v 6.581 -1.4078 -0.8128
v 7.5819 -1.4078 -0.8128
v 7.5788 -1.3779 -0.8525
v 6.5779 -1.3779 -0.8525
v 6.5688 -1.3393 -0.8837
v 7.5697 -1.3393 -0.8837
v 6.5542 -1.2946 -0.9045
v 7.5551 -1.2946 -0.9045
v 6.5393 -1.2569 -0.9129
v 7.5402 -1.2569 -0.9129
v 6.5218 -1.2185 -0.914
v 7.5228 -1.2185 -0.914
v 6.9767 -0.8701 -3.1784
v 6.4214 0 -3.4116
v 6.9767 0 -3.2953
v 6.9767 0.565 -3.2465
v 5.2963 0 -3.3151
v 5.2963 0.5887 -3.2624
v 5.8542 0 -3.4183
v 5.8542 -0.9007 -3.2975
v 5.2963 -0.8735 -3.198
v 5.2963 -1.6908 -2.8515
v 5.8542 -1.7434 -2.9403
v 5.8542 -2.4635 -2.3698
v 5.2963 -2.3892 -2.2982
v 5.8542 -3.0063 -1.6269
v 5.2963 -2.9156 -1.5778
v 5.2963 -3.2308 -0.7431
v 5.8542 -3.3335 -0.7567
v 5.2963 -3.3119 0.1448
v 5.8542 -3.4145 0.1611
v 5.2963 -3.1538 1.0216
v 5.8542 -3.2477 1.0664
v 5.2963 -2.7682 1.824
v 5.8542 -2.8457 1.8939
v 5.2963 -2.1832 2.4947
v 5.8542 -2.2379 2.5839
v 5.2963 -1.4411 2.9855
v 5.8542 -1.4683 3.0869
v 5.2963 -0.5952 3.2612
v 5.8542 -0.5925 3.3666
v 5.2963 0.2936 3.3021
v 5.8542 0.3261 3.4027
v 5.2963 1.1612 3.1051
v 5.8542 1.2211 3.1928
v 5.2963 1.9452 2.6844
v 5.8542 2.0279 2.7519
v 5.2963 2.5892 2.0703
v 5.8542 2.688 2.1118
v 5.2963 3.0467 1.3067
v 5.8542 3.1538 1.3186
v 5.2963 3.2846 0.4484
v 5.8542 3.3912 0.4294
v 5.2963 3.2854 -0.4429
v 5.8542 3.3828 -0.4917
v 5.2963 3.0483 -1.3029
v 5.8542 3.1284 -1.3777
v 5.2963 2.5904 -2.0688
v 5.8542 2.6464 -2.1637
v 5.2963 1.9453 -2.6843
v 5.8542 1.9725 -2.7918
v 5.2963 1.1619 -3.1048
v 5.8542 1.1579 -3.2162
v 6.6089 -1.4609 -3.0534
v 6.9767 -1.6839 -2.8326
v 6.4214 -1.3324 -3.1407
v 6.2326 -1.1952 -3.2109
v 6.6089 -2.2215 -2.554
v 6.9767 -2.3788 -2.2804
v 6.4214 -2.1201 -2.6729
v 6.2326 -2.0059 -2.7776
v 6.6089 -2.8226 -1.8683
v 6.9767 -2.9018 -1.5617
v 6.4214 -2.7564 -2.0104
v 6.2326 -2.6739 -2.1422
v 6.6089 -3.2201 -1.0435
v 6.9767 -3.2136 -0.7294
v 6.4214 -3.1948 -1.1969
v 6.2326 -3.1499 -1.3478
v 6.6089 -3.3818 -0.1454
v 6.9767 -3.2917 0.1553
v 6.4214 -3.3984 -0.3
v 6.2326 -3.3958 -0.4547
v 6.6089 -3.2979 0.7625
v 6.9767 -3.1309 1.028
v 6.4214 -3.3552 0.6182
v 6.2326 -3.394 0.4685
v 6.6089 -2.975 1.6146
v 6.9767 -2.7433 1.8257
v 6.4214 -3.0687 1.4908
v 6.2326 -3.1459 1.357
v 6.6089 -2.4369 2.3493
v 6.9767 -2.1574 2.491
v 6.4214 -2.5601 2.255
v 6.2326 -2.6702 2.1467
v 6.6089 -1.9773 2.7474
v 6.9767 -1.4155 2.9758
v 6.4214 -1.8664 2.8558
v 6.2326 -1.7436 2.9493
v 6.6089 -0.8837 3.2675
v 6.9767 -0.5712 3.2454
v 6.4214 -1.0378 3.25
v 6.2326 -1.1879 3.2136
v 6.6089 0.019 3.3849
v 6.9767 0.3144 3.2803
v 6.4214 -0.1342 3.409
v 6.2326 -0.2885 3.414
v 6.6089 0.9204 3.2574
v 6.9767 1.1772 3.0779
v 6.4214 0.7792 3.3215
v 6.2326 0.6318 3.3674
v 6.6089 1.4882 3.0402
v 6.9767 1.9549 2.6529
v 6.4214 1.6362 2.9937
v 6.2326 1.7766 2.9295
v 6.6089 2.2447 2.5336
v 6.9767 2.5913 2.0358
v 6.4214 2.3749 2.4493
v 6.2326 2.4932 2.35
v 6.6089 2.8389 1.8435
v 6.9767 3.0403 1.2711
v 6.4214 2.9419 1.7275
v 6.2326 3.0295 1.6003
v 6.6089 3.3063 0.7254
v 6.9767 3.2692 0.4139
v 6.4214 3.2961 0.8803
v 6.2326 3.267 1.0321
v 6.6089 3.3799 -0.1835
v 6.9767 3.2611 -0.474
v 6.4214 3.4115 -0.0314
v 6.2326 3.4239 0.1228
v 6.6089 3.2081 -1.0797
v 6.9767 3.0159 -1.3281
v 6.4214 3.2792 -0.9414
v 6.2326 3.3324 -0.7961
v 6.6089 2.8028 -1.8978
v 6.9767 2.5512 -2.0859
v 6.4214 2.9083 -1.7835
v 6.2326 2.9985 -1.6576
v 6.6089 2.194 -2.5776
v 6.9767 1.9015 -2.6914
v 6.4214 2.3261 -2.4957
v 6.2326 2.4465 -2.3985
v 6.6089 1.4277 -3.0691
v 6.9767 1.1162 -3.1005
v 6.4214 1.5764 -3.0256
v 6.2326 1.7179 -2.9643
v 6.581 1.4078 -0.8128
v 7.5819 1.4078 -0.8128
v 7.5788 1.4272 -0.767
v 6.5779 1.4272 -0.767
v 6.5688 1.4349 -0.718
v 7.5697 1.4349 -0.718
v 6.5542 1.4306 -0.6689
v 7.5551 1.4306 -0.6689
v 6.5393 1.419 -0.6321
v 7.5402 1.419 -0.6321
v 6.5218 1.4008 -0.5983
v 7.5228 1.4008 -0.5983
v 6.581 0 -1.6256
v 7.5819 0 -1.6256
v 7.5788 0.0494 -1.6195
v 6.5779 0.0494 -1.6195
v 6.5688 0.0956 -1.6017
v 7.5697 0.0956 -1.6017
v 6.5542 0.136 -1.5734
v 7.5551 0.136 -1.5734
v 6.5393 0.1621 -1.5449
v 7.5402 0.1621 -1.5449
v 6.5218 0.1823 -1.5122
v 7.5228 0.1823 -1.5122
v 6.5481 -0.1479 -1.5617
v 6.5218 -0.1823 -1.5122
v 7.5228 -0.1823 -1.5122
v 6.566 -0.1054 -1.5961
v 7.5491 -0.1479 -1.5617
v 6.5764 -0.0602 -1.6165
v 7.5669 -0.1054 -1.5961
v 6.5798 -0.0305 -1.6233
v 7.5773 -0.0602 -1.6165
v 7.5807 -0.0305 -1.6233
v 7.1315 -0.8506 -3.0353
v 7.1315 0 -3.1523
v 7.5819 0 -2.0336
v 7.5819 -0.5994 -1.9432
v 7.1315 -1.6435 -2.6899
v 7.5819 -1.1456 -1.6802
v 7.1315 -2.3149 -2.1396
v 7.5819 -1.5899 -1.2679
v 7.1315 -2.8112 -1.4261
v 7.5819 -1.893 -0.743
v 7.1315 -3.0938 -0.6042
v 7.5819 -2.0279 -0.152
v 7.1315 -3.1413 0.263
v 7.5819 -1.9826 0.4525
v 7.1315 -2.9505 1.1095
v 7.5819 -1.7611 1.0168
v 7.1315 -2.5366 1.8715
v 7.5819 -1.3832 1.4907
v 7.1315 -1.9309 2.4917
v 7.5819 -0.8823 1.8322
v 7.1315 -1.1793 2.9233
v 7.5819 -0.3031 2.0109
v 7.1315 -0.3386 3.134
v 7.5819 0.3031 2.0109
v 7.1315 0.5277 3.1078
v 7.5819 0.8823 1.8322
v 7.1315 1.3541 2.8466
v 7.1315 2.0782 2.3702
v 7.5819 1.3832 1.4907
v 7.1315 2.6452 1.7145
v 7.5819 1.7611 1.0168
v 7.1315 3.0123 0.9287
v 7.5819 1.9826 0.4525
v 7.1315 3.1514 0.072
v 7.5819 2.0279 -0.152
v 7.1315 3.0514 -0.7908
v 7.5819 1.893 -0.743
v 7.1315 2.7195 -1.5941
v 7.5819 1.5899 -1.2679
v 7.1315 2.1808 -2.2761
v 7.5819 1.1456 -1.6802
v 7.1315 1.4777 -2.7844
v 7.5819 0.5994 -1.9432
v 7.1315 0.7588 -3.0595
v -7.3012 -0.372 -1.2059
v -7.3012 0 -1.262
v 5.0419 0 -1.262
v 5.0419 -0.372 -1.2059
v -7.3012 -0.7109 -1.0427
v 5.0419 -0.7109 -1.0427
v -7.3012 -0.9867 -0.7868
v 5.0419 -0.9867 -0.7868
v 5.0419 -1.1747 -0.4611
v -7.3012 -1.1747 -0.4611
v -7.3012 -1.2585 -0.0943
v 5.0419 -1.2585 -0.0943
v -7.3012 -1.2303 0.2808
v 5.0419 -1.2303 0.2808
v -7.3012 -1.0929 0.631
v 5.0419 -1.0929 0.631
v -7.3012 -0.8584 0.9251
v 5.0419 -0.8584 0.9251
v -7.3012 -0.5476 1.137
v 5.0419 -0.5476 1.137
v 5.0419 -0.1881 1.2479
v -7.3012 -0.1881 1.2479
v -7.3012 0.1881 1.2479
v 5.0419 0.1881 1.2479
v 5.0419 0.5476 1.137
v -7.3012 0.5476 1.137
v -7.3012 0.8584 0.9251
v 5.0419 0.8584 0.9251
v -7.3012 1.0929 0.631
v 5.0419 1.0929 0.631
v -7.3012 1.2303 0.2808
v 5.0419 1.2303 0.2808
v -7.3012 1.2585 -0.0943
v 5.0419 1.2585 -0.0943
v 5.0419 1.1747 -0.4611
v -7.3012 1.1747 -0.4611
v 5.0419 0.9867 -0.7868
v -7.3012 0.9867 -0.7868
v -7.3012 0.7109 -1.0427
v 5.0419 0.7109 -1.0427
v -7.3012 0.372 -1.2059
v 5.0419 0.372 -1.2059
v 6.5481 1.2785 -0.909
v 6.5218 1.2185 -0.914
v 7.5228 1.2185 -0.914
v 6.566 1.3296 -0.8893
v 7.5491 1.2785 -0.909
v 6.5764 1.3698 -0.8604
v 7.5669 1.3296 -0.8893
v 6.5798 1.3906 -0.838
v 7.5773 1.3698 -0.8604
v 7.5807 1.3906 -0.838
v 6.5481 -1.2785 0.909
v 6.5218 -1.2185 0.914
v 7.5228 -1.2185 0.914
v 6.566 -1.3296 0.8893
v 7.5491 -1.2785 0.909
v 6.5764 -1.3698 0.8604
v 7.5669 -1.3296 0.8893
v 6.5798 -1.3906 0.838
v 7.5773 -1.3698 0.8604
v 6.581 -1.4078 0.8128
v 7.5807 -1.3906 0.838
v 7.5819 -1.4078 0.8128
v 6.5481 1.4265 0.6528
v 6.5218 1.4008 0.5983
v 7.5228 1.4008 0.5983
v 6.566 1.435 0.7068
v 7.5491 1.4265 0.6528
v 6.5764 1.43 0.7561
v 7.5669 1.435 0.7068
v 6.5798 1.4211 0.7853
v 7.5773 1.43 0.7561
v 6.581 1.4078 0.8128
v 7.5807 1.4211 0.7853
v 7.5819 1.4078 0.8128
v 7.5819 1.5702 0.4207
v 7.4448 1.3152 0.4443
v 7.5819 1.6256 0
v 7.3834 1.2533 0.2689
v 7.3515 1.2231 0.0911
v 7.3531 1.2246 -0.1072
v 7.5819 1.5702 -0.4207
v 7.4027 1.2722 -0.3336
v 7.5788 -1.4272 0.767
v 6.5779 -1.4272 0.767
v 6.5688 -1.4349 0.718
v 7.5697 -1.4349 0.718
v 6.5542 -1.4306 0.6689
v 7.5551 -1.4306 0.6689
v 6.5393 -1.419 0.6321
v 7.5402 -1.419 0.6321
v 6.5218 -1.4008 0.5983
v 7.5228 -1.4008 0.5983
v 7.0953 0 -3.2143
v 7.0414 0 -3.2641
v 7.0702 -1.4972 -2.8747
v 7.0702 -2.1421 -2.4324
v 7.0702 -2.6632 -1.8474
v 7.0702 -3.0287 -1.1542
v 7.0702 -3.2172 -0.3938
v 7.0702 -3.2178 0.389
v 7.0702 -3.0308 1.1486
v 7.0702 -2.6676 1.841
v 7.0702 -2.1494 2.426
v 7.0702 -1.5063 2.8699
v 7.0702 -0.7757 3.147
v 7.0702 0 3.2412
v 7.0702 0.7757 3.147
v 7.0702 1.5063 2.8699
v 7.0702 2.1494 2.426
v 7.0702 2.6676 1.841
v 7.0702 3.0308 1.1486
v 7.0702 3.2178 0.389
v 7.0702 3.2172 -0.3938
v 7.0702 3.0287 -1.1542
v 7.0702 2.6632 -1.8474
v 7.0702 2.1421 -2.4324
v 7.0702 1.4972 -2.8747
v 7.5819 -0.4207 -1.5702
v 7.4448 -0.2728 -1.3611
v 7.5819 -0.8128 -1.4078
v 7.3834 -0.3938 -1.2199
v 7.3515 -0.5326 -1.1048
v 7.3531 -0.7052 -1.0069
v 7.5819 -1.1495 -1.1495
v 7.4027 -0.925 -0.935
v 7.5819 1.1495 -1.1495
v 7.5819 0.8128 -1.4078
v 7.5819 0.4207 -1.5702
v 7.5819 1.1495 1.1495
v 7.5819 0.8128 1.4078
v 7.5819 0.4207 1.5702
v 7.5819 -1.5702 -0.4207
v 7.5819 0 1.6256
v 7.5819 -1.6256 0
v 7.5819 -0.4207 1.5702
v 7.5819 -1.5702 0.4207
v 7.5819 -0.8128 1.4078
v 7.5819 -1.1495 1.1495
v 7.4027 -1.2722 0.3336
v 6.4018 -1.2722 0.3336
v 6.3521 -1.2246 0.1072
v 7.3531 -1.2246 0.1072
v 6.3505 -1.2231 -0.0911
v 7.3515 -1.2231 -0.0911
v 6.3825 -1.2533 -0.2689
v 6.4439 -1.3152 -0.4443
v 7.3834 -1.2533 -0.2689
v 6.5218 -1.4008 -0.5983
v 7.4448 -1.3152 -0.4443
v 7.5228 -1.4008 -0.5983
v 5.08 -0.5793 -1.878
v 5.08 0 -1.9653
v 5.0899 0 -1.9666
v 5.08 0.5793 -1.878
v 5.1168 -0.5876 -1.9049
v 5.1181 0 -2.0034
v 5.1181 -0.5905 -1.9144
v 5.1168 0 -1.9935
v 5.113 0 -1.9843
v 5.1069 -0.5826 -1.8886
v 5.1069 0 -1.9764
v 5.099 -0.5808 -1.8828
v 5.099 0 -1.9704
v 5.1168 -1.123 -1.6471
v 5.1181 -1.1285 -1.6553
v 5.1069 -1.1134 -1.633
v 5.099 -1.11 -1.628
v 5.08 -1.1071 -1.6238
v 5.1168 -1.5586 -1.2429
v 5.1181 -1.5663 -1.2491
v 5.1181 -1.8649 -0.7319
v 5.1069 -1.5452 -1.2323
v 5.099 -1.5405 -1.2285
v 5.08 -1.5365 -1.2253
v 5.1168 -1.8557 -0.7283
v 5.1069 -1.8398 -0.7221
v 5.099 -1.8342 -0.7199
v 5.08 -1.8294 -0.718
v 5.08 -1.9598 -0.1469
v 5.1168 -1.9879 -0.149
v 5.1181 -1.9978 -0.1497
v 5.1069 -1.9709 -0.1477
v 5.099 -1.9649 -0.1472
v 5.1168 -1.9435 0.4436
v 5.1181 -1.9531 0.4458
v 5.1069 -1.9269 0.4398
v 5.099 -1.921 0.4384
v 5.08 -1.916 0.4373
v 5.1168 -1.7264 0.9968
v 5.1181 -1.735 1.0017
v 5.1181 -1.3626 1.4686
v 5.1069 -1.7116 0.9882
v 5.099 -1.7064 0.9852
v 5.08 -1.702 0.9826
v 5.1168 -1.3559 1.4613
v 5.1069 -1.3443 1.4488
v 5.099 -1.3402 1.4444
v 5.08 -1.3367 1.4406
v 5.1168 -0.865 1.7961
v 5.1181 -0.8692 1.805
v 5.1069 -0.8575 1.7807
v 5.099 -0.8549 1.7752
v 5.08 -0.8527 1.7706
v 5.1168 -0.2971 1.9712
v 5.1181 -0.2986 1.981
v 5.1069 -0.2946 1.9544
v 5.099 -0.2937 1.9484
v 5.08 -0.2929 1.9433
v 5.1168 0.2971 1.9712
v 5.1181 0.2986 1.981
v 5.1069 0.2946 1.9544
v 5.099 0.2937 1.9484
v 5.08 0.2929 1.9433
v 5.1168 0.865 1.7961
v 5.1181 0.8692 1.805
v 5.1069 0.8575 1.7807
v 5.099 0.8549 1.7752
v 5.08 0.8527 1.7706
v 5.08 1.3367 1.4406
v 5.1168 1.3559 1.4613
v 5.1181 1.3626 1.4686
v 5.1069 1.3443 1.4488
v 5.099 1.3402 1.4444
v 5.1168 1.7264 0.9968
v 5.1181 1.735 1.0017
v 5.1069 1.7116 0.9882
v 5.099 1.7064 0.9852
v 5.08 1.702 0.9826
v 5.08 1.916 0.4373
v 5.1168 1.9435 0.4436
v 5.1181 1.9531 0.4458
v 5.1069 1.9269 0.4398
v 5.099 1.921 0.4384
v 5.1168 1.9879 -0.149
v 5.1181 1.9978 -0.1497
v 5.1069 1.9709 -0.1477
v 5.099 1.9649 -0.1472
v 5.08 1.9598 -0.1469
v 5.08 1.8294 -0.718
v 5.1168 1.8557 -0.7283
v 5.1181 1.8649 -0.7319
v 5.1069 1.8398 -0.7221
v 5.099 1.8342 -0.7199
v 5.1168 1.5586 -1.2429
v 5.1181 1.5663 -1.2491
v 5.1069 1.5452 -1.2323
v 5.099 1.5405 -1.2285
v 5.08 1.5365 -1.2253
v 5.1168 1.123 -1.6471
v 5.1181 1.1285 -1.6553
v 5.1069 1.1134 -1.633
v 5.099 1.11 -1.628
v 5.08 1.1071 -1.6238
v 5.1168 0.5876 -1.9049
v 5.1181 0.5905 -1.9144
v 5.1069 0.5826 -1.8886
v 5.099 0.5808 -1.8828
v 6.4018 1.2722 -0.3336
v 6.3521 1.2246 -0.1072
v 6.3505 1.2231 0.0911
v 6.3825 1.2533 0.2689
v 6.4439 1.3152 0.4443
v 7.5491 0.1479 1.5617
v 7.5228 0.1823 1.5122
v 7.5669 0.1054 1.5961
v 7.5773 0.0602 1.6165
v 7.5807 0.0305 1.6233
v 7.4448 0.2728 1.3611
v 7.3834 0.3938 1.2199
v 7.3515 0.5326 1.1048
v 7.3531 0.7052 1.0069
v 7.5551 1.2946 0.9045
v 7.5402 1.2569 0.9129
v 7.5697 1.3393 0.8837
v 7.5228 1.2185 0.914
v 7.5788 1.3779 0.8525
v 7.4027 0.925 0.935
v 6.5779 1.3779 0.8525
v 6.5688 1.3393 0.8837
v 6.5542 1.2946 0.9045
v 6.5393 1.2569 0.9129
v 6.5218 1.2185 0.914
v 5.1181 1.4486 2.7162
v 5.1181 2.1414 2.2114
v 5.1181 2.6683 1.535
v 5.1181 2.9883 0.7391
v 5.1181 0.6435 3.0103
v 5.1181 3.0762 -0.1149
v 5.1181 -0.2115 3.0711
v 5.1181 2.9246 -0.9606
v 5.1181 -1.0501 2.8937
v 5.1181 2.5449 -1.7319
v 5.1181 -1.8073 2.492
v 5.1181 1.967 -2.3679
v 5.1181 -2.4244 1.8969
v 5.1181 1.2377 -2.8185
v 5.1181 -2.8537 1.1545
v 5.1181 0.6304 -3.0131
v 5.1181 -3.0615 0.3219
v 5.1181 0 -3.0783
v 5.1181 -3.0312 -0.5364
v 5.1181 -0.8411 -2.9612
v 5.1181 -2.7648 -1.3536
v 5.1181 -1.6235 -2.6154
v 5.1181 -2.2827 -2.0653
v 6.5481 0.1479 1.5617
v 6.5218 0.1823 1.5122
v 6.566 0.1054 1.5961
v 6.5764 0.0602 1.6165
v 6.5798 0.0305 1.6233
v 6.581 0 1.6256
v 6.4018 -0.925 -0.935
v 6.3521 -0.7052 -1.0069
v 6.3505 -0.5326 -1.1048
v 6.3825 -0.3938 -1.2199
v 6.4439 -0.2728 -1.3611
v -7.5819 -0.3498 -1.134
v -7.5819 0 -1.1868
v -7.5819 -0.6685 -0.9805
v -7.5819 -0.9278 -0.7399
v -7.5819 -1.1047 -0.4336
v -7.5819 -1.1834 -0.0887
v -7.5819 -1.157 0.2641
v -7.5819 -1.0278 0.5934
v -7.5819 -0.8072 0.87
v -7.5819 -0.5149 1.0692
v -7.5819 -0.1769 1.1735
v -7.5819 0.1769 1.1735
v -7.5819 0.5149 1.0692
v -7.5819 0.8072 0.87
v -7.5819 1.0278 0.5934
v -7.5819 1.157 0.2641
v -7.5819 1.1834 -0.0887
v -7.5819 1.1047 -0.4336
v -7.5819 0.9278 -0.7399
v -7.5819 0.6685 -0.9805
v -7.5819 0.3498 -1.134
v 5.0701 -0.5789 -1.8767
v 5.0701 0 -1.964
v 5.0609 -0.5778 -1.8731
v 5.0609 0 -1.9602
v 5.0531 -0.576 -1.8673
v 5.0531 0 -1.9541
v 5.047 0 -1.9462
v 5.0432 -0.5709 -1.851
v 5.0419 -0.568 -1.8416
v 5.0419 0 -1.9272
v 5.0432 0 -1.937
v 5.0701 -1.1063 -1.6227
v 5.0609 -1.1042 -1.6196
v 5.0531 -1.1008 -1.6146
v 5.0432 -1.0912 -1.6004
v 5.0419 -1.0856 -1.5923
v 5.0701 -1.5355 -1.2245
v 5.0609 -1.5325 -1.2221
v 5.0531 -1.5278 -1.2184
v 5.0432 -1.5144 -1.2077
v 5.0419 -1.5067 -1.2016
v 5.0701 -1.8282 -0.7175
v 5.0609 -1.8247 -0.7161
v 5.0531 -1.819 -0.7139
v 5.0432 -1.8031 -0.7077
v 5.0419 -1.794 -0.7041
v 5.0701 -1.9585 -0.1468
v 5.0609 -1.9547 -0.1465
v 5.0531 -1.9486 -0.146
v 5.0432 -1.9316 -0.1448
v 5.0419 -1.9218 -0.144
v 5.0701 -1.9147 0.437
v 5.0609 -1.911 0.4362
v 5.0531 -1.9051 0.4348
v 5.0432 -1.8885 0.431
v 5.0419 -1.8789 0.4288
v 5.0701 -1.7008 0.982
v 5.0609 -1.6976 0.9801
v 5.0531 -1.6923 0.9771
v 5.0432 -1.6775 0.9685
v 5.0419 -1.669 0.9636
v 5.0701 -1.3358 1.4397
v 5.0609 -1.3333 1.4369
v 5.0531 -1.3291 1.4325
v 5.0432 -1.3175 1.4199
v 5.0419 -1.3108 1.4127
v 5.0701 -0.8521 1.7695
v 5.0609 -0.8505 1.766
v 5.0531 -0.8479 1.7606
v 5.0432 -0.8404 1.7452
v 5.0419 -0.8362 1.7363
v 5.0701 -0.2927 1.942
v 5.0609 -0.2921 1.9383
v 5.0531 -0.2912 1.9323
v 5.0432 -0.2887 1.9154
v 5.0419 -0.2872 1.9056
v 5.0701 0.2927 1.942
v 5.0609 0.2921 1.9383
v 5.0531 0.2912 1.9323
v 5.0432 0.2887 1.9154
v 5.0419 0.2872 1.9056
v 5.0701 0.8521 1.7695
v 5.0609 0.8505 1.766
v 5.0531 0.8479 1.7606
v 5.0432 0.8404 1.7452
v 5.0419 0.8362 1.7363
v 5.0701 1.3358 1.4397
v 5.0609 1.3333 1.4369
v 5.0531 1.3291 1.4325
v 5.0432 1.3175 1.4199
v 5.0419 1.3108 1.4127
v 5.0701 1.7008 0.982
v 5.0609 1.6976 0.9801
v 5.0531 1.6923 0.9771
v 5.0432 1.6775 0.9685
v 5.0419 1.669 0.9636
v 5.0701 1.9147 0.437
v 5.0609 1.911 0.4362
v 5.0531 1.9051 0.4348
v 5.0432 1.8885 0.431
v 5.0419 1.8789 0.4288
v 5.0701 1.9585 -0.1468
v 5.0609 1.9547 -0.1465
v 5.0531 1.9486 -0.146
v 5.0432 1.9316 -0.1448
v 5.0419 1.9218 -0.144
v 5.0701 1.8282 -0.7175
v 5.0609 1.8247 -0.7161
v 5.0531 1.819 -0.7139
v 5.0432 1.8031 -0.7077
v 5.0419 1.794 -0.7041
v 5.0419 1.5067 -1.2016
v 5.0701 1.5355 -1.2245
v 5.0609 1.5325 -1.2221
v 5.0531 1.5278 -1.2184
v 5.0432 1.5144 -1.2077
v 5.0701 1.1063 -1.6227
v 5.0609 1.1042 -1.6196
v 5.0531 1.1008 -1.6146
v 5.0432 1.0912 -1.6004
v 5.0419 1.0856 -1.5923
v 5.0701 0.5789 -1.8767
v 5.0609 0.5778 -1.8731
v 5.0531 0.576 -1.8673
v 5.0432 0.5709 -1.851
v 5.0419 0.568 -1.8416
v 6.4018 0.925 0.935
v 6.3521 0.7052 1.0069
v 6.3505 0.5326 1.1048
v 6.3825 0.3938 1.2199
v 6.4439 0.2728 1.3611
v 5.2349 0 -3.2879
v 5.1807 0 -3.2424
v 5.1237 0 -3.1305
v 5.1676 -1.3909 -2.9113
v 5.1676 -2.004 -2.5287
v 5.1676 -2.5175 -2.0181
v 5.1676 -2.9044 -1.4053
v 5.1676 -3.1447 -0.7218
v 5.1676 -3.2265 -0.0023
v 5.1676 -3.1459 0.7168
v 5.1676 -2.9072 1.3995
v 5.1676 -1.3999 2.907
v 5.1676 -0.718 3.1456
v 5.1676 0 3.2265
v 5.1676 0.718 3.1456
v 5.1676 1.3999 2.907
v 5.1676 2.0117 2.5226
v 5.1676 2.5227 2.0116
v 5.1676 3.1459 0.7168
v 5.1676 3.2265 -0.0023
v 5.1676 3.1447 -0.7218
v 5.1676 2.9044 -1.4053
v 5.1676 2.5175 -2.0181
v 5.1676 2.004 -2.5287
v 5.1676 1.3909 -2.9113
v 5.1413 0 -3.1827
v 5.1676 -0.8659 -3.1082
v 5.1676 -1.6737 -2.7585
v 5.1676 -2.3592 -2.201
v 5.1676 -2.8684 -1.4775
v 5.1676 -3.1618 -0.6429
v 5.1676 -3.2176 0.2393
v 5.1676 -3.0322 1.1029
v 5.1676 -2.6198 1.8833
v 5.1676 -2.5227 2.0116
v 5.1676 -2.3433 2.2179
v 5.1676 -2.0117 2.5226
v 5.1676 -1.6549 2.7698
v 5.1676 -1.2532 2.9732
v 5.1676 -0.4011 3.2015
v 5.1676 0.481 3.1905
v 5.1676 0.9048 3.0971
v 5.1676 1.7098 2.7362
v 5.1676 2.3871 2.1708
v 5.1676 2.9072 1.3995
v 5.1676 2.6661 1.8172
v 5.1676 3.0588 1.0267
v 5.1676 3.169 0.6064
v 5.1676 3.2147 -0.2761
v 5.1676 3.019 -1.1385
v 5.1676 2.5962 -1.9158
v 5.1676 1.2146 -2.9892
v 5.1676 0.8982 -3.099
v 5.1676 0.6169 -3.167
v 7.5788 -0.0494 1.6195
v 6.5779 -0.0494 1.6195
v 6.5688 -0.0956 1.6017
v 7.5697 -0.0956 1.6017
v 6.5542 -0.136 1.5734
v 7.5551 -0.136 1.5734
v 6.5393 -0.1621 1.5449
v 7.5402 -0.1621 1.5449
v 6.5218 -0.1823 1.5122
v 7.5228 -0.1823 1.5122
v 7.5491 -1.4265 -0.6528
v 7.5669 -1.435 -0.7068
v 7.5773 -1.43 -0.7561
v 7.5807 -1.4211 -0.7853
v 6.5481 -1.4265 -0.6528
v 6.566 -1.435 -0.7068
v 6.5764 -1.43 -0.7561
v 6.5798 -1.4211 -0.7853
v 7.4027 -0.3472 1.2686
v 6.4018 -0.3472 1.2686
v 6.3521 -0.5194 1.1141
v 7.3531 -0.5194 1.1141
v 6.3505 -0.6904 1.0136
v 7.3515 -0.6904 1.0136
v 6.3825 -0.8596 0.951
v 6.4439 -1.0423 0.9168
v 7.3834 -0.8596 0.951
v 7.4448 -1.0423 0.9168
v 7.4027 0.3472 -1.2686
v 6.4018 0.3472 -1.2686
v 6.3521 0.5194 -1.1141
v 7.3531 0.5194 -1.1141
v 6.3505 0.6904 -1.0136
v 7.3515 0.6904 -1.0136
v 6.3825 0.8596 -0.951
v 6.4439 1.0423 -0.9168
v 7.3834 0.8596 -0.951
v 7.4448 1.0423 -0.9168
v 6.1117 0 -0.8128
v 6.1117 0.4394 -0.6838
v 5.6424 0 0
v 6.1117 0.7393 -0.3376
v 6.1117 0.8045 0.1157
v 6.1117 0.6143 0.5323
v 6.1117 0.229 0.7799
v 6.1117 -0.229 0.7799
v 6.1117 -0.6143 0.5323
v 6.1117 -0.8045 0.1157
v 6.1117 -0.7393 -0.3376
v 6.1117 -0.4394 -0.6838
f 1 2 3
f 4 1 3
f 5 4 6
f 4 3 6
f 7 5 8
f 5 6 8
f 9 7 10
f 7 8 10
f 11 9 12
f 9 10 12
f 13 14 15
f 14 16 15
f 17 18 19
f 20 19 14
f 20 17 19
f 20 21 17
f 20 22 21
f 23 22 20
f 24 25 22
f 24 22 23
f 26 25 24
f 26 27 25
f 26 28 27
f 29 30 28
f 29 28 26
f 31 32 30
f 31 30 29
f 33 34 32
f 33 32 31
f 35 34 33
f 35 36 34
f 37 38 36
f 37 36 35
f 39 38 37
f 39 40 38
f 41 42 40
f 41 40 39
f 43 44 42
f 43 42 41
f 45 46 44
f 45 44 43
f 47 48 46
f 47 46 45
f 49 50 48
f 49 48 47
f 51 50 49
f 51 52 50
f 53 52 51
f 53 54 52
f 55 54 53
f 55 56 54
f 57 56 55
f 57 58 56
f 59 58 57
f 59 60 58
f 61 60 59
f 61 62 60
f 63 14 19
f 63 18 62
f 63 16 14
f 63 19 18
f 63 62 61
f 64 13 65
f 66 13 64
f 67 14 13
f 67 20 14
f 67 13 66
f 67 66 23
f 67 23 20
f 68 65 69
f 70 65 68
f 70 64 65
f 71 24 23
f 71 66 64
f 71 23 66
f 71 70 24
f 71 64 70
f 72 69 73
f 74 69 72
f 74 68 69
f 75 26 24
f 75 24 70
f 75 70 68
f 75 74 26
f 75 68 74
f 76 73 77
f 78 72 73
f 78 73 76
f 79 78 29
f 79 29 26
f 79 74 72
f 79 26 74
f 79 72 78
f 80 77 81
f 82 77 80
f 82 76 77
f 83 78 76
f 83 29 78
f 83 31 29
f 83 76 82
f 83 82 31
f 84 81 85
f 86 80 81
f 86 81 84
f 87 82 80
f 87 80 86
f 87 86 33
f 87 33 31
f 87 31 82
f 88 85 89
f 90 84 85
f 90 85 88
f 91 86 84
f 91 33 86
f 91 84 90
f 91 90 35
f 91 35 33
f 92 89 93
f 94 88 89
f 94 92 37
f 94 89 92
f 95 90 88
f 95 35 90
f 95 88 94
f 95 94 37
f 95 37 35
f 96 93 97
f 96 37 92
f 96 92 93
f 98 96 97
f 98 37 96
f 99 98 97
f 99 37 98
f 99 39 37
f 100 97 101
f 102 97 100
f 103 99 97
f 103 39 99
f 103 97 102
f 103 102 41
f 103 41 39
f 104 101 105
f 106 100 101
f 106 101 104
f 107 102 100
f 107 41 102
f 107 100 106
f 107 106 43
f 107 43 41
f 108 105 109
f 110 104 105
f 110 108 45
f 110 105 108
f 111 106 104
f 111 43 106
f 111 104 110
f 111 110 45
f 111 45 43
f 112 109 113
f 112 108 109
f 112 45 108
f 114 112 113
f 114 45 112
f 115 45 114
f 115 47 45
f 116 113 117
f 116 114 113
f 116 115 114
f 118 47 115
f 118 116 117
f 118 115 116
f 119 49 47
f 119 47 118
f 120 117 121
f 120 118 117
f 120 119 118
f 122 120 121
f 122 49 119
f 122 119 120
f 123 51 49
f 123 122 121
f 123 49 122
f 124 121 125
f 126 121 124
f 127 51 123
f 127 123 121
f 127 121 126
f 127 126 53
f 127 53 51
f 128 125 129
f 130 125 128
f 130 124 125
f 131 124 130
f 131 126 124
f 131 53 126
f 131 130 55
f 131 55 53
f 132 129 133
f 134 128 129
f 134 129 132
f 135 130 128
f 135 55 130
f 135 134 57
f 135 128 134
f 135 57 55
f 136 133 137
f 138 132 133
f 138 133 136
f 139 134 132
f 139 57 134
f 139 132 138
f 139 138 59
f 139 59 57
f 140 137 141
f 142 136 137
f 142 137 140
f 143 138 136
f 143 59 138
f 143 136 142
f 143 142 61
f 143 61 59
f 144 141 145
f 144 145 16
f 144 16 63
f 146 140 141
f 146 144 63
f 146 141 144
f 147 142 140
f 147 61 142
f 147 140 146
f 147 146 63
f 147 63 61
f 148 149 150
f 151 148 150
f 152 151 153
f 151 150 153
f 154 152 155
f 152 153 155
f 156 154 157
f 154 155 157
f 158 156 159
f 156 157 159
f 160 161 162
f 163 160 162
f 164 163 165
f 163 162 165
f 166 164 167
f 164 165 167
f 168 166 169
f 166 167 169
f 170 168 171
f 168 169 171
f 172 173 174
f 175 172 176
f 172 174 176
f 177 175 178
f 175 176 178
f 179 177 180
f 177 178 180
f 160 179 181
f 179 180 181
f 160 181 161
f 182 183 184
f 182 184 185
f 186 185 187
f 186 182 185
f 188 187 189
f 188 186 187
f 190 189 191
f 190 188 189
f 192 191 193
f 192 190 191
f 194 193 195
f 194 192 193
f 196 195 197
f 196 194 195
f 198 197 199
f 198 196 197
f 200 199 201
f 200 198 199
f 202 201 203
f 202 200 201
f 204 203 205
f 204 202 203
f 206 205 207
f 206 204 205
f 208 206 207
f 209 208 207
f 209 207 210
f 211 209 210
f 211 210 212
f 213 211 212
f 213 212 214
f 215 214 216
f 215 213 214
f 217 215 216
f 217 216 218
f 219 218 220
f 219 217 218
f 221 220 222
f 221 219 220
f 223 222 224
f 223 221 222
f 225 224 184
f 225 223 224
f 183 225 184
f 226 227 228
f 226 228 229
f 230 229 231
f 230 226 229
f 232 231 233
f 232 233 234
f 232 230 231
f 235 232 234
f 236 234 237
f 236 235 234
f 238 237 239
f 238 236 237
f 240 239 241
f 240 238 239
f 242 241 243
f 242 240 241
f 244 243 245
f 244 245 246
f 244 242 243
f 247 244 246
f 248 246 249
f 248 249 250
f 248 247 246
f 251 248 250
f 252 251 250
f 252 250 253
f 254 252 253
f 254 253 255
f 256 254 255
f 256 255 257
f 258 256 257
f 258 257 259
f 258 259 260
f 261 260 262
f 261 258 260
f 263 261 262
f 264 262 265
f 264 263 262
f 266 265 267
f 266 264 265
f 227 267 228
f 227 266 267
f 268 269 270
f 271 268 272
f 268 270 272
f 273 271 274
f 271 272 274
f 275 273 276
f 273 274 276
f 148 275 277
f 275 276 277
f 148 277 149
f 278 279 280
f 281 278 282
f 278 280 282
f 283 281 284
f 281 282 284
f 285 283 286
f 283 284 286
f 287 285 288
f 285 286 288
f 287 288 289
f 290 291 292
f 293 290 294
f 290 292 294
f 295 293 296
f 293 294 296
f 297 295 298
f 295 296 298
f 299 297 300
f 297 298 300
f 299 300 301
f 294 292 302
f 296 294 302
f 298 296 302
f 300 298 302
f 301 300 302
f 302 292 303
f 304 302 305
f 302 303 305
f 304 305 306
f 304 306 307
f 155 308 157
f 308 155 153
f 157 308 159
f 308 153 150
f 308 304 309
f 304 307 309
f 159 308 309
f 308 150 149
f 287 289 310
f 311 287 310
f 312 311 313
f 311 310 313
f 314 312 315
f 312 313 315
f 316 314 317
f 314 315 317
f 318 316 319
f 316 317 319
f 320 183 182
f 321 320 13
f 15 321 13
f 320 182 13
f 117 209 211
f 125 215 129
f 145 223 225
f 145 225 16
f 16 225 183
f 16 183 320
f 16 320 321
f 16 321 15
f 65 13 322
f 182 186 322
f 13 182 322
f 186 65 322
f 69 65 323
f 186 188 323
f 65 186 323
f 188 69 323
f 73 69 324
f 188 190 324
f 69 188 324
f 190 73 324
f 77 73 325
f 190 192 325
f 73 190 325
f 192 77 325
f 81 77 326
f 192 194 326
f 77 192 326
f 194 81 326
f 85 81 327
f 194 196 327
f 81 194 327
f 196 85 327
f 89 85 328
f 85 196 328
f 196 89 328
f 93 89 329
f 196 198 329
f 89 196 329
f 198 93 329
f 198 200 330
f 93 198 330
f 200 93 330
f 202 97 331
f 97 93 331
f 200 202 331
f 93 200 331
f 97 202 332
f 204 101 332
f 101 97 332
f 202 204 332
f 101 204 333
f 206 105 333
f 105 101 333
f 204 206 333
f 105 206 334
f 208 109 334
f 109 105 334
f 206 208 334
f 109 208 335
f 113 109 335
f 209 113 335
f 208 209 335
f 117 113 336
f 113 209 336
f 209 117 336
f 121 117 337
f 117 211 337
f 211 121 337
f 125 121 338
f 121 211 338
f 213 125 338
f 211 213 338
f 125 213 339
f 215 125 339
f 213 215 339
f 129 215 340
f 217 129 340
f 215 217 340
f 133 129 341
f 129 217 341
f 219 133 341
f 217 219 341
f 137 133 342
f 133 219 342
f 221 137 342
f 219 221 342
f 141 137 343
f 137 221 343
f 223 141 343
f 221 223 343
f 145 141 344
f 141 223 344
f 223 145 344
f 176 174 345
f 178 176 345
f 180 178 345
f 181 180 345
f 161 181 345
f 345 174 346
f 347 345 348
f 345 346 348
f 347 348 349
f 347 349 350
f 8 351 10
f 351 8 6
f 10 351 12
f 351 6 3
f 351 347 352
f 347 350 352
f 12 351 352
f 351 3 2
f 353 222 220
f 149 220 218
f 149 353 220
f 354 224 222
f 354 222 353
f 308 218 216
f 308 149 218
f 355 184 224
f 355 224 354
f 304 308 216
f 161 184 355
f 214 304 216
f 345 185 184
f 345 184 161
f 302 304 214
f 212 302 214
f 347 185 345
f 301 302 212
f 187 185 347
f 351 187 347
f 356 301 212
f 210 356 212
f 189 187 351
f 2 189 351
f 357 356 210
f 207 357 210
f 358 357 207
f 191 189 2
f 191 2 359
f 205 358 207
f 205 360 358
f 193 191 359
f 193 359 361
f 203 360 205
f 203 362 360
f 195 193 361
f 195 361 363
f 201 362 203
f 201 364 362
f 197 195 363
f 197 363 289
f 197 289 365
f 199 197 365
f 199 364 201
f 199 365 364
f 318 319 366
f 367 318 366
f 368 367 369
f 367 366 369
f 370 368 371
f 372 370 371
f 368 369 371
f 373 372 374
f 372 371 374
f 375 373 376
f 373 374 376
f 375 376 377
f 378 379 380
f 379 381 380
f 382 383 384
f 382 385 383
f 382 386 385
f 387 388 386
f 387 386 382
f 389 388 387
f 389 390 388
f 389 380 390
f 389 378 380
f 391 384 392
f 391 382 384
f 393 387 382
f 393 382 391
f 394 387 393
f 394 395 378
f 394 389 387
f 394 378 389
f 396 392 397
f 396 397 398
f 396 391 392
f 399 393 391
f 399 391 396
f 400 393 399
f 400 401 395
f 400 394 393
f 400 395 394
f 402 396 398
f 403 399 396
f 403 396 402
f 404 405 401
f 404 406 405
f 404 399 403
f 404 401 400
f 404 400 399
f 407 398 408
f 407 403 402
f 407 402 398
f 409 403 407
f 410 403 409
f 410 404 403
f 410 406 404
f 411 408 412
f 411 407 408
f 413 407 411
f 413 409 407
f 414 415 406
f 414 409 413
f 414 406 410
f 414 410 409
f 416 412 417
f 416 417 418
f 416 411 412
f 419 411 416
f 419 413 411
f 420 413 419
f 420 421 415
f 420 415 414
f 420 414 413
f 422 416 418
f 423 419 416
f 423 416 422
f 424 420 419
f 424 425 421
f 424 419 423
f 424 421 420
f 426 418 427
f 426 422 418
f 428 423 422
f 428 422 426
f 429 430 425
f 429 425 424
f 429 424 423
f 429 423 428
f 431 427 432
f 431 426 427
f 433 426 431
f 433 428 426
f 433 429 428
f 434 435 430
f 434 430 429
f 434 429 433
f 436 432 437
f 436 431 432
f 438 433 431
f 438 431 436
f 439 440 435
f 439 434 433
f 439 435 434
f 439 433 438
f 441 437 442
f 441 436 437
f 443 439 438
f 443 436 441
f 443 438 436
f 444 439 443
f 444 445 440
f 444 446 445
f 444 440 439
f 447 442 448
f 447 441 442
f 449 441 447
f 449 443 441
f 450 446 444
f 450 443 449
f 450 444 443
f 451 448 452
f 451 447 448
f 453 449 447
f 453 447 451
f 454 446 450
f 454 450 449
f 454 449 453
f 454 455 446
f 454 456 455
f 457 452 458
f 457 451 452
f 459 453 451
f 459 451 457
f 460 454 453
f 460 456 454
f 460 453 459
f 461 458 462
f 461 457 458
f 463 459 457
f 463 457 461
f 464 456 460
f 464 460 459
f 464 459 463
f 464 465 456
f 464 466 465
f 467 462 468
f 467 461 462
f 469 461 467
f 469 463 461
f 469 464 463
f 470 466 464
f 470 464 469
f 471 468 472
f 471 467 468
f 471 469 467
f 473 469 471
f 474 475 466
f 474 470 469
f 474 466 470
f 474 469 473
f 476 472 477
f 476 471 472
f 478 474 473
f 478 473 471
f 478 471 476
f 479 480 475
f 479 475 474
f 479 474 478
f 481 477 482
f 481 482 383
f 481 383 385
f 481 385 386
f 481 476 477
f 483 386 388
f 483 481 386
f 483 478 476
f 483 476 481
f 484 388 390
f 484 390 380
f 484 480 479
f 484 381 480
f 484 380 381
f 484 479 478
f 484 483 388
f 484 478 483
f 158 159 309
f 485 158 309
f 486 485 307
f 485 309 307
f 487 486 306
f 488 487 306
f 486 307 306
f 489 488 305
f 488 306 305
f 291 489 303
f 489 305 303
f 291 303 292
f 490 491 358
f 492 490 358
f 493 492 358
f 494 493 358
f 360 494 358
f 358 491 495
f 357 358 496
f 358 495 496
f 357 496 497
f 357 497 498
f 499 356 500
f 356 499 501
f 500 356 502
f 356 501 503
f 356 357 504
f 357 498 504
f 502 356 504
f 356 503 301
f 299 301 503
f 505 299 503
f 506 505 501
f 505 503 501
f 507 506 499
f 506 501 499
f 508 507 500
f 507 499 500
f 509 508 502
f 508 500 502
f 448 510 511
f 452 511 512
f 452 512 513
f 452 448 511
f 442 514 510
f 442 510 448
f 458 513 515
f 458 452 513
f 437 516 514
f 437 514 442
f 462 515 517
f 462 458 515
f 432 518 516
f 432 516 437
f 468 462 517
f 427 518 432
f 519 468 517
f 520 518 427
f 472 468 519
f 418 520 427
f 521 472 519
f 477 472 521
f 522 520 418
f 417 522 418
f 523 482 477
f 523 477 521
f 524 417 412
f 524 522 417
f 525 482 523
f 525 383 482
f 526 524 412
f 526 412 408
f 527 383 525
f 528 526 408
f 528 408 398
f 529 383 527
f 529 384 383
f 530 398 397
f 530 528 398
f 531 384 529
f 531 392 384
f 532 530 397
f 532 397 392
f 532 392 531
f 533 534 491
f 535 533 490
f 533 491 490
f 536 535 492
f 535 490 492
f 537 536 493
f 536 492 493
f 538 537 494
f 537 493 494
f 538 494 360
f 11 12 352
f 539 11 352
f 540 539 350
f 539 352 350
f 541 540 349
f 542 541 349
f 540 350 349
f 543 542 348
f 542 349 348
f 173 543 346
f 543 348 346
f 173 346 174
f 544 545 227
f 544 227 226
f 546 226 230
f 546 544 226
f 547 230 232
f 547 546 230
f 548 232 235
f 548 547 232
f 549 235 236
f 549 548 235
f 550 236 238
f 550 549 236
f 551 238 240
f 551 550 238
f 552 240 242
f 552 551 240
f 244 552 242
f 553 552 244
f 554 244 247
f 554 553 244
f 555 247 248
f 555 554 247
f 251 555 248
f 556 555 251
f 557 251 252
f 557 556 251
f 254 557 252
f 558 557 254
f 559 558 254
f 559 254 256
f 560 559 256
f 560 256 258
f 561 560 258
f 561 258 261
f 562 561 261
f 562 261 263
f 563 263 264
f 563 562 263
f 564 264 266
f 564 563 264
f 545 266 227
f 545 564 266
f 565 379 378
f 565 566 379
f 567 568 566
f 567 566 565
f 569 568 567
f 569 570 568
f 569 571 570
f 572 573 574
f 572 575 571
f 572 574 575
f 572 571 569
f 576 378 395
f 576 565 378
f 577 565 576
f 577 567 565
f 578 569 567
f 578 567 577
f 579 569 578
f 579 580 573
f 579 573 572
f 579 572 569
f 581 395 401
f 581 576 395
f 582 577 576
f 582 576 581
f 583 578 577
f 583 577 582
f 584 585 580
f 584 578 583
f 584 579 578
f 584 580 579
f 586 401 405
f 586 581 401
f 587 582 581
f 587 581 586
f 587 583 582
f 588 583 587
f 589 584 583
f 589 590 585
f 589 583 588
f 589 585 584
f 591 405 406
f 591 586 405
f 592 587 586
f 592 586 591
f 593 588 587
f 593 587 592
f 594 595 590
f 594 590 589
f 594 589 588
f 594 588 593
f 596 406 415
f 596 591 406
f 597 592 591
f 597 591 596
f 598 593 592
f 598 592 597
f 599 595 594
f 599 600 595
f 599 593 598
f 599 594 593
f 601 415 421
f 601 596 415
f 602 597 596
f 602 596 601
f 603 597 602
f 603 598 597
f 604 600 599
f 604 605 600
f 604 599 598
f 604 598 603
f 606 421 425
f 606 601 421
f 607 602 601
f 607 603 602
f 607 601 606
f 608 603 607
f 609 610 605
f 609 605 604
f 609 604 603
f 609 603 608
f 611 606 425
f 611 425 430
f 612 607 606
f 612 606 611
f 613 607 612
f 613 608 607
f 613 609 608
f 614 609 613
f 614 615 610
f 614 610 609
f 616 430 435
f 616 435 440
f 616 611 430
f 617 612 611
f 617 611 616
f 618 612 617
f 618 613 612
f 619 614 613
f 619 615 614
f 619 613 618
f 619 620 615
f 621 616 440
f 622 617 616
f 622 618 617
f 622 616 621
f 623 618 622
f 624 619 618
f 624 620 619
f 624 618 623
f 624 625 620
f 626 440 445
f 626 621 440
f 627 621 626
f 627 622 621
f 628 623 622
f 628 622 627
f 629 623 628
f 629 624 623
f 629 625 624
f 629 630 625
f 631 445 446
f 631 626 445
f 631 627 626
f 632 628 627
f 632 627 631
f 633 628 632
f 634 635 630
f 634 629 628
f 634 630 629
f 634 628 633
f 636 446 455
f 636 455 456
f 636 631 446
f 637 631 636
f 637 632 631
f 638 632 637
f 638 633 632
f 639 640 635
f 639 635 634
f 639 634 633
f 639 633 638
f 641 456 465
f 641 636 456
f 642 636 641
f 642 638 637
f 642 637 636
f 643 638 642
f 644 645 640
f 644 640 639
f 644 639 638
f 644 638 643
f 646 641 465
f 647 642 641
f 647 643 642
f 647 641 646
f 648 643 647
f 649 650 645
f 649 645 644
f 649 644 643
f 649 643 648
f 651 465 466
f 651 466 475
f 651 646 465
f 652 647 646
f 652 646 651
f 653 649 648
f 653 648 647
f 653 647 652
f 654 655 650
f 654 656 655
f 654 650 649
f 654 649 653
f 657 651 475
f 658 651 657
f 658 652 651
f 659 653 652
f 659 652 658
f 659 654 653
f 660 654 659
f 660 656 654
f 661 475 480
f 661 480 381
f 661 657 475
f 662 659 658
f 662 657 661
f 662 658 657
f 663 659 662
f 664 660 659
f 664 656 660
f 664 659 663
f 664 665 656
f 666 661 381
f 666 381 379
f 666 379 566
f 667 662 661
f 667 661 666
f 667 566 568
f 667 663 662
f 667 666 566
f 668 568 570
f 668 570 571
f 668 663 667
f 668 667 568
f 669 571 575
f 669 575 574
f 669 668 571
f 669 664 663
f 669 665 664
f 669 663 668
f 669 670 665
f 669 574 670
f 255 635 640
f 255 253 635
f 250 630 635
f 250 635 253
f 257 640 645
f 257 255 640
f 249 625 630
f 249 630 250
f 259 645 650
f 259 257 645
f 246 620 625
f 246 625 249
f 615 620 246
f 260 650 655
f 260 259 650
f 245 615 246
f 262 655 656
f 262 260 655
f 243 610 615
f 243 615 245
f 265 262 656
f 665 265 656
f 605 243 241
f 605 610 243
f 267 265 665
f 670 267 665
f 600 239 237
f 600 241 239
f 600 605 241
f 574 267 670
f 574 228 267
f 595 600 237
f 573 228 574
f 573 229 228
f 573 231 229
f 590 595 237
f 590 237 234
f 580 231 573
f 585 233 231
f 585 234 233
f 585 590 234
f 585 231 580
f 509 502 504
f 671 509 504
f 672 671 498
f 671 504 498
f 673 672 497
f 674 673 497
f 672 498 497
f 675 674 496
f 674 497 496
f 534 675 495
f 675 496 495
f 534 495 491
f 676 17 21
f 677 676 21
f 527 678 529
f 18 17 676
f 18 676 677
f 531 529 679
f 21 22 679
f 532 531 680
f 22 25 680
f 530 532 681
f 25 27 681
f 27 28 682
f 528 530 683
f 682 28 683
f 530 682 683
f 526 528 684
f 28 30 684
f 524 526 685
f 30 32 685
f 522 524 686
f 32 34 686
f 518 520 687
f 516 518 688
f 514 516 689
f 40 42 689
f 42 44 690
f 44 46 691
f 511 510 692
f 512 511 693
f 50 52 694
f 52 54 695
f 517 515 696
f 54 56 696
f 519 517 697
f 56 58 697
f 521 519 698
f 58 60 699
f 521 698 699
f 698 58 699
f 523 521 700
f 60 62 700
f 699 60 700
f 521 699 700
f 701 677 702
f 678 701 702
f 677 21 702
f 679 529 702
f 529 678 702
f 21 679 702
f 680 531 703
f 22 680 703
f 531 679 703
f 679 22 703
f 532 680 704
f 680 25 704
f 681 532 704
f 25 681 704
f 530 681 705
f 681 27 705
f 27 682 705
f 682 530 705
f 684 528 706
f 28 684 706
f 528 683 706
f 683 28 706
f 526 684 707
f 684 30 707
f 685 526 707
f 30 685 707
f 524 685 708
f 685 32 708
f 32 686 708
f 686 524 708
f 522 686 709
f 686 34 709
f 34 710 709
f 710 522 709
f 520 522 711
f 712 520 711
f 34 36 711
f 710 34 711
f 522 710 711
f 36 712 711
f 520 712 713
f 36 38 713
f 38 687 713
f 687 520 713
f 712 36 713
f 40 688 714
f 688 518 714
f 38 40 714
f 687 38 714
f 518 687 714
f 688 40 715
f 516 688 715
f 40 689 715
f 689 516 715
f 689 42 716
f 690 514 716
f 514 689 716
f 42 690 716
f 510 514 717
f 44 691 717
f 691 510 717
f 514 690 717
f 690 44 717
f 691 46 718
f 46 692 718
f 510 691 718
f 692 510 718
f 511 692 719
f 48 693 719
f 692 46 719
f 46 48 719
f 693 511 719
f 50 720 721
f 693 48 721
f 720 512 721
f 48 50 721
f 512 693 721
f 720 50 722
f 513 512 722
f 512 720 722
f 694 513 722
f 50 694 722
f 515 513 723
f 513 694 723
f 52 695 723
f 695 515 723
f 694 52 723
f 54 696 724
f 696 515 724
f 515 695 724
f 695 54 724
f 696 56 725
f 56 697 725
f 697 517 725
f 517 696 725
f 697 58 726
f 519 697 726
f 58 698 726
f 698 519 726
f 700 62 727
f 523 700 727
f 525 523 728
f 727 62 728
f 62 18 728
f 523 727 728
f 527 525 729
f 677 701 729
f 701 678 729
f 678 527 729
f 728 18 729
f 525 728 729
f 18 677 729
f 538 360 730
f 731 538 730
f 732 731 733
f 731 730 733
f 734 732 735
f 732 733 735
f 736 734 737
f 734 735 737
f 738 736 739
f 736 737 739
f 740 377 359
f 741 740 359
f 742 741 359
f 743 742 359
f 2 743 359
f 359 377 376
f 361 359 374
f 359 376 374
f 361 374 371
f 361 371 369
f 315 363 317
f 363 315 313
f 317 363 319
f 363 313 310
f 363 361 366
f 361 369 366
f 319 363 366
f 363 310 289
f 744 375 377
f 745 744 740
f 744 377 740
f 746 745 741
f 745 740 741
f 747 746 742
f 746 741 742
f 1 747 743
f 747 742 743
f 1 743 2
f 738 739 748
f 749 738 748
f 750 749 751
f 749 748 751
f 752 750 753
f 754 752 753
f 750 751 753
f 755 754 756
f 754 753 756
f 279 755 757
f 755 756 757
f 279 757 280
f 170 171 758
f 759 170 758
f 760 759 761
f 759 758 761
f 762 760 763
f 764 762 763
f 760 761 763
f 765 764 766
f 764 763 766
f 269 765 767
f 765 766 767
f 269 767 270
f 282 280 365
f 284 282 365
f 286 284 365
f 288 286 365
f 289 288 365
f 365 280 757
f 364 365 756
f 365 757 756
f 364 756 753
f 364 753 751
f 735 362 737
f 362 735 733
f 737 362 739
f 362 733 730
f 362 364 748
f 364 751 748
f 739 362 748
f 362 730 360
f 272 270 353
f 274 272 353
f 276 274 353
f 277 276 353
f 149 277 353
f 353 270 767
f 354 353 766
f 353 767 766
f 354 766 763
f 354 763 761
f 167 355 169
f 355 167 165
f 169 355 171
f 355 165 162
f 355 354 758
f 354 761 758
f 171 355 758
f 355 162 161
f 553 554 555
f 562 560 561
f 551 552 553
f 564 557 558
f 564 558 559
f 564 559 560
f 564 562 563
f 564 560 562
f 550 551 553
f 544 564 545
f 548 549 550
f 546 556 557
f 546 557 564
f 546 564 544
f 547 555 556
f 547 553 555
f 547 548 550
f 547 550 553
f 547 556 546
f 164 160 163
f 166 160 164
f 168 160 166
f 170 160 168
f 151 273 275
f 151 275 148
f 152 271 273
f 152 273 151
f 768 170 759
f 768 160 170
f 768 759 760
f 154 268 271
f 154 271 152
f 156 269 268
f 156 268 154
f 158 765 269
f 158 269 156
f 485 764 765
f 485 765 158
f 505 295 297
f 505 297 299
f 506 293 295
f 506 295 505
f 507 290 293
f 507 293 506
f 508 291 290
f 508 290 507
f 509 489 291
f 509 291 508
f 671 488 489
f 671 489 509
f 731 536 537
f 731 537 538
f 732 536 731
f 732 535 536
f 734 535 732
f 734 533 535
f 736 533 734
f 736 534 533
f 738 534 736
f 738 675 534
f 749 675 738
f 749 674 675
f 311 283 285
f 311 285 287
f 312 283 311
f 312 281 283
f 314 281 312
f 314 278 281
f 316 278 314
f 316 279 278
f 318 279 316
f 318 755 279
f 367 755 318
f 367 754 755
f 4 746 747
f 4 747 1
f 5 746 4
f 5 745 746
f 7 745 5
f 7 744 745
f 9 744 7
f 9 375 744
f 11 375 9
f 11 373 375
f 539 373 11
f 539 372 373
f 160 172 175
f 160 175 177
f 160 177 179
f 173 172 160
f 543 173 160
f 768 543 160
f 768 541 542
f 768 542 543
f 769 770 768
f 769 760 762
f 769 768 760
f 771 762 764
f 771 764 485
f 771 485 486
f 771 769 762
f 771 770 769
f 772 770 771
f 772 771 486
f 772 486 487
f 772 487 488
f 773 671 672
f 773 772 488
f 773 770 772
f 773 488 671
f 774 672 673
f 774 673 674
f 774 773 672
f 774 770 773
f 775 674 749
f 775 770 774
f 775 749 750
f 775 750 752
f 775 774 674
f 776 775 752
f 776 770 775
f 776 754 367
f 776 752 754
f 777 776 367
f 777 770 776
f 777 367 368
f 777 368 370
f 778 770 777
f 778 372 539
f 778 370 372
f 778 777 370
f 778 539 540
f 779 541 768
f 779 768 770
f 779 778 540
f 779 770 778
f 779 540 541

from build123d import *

# Parameters (mm, degrees)
BOSS_EXTRUDE1_REACH = 17.92
SKETCH3_R           = 2.0335875
FILLET1_R           = 0.24638
CHAMFER1_SIZE       = 0.280736842
CHAMFER1_SIZE2      = 0.07522321


with BuildPart() as part:
    # Sketch2 → Revolve1 (revolve)
    with BuildSketch(Plane.XY):
        with BuildLine():
            Line((-7.5819, 0), (7.5819, 0))
            Line((7.5819, 0), (7.5819, 2.0335875))
            Line((7.5819, 2.0335875), (7.08914, 3.25755))
            ThreePointArc((7.08914, 3.25755), (6.10362, 3.429), (5.1181, 3.25755))
            Line((5.1181, 3.25755), (5.1181, 2.003369298))
            ThreePointArc((5.1181, 2.003369298), (5.106940768, 1.97642853), (5.08, 1.965269298))
            ThreePointArc((5.08, 1.965269298), (5.053059232, 1.954110067), (5.0419, 1.927169298))
            Line((5.0419, 1.927169298), (5.0419, 1.261978947))
            Line((5.0419, 1.261978947), (-7.5819, 1.261978947))
            Line((-7.5819, 1.261978947), (-7.5819, 0))
        make_face()
    revolve(axis=Axis((-7.5819, 0, 0), (-1, 0, 0)))

    # Sketch12 → Cut-Revolve3 (revolve, cut)
    with BuildSketch(Plane.XY):
        Polygon((7.5819, 1.6256), (6.58098125, 1.6256), (5.642440652, 0), (7.5819, 0), align=None)
    revolve(axis=Axis((-7.5819, 0, 0), (1, 0, 0)), mode=Mode.SUBTRACT)

    # Boss-Extrude1: up to this cone (the profile starts inside it)
    boss_extrude1_end = Plane(origin=(7.5819, 0, 0), z_dir=(1, 0, 0)).offset(-1.939458348) * Cone(1.732e-06, 41.081996047, 23.718700477, align=(Align.CENTER, Align.CENTER, Align.MIN), mode=Mode.PRIVATE)
    # Sketch3 → Boss-Extrude1 (add, up to the surface)
    with BuildSketch(Plane(origin=(7.5819, 0, 0), x_dir=(0, 0, -1), z_dir=(1, 0, 0)), mode=Mode.PRIVATE) as boss_extrude1_sk1:
        Circle(SKETCH3_R)
        with BuildLine():
            ThreePointArc((1.51222877, -0.182266377), (1.594944844, -0.107324354), (1.6256, 0))
            ThreePointArc((1.6256, 0), (1.594944844, 0.107324354), (1.51222877, 0.182266377))
            ThreePointArc((1.51222877, 0.182266377), (1.055858172, 0.6096), (0.913961698, 1.218495343))
            ThreePointArc((0.913961698, 1.218495343), (0.890418039, 1.327600575), (0.8128, 1.407810896))
            ThreePointArc((0.8128, 1.407810896), (0.704526805, 1.434924929), (0.598267073, 1.40076172))
            ThreePointArc((0.598267073, 1.40076172), (0, 1.2192), (-0.598267073, 1.40076172))
            ThreePointArc((-0.598267073, 1.40076172), (-0.704526805, 1.434924929), (-0.8128, 1.407810896))
            ThreePointArc((-0.8128, 1.407810896), (-0.890418039, 1.327600575), (-0.913961698, 1.218495343))
            ThreePointArc((-0.913961698, 1.218495343), (-1.055858172, 0.6096), (-1.51222877, 0.182266377))
            ThreePointArc((-1.51222877, 0.182266377), (-1.594944844, 0.107324354), (-1.6256, 0))
            ThreePointArc((-1.6256, 0), (-1.594944844, -0.107324354), (-1.51222877, -0.182266377))
            ThreePointArc((-1.51222877, -0.182266377), (-1.055858172, -0.6096), (-0.913961698, -1.218495343))
            ThreePointArc((-0.913961698, -1.218495343), (-0.890418039, -1.327600575), (-0.8128, -1.407810896))
            ThreePointArc((-0.8128, -1.407810896), (-0.704526805, -1.434924929), (-0.598267073, -1.40076172))
            ThreePointArc((-0.598267073, -1.40076172), (0, -1.2192), (0.598267073, -1.40076172))
            ThreePointArc((0.598267073, -1.40076172), (0.704526805, -1.434924929), (0.8128, -1.407810896))
            ThreePointArc((0.8128, -1.407810896), (0.890418039, -1.327600575), (0.913961698, -1.218495343))
            ThreePointArc((0.913961698, -1.218495343), (1.055858172, -0.6096), (1.51222877, -0.182266377))
        make_face(mode=Mode.SUBTRACT)
    boss_extrude1_tool1 = extrude(boss_extrude1_sk1.sketch, amount=-BOSS_EXTRUDE1_REACH, mode=Mode.PRIVATE) & boss_extrude1_end
    add(boss_extrude1_tool1.solids().sort_by_distance((7.5819, 0, 1.976069))[0])

    # Cut-Extrude2 cone 1 section (through the dimple's axis) → Cut-Extrude2 (revolve, cut)
    with BuildSketch(Plane(origin=(7.5819, 0, 0), x_dir=(0, 0, -1), z_dir=(0, 1, 0))):
        Polygon((0, 0), (1.6256, 0), (0, 0.938540598), align=None)
    revolve(axis=Axis((7.5819, 0, 0), (-1, 0, 0)), mode=Mode.SUBTRACT)

    # Fillet1
    fillet1_edges = [part.edges().sort_by_distance(p)[0] for p in [
        (5.1181, -3.25755, 0),
        (7.08914, -3.25755, 0),
    ]]
    fillet(fillet1_edges, radius=FILLET1_R)

    # Chamfer1
    chamfer1_edges = [part.edges().sort_by_distance(p)[0] for p in [
        (-7.5819, -1.261978947, 0),
    ]]
    chamfer1_side = [part.faces().sort_by_distance(p)[0] for p in [
        (-1.27, -1.261978947, 0),
    ]]
    chamfer(chamfer1_edges, length=CHAMFER1_SIZE, length2=CHAMFER1_SIZE2, reference=chamfer1_side[0])


solid = part.part
